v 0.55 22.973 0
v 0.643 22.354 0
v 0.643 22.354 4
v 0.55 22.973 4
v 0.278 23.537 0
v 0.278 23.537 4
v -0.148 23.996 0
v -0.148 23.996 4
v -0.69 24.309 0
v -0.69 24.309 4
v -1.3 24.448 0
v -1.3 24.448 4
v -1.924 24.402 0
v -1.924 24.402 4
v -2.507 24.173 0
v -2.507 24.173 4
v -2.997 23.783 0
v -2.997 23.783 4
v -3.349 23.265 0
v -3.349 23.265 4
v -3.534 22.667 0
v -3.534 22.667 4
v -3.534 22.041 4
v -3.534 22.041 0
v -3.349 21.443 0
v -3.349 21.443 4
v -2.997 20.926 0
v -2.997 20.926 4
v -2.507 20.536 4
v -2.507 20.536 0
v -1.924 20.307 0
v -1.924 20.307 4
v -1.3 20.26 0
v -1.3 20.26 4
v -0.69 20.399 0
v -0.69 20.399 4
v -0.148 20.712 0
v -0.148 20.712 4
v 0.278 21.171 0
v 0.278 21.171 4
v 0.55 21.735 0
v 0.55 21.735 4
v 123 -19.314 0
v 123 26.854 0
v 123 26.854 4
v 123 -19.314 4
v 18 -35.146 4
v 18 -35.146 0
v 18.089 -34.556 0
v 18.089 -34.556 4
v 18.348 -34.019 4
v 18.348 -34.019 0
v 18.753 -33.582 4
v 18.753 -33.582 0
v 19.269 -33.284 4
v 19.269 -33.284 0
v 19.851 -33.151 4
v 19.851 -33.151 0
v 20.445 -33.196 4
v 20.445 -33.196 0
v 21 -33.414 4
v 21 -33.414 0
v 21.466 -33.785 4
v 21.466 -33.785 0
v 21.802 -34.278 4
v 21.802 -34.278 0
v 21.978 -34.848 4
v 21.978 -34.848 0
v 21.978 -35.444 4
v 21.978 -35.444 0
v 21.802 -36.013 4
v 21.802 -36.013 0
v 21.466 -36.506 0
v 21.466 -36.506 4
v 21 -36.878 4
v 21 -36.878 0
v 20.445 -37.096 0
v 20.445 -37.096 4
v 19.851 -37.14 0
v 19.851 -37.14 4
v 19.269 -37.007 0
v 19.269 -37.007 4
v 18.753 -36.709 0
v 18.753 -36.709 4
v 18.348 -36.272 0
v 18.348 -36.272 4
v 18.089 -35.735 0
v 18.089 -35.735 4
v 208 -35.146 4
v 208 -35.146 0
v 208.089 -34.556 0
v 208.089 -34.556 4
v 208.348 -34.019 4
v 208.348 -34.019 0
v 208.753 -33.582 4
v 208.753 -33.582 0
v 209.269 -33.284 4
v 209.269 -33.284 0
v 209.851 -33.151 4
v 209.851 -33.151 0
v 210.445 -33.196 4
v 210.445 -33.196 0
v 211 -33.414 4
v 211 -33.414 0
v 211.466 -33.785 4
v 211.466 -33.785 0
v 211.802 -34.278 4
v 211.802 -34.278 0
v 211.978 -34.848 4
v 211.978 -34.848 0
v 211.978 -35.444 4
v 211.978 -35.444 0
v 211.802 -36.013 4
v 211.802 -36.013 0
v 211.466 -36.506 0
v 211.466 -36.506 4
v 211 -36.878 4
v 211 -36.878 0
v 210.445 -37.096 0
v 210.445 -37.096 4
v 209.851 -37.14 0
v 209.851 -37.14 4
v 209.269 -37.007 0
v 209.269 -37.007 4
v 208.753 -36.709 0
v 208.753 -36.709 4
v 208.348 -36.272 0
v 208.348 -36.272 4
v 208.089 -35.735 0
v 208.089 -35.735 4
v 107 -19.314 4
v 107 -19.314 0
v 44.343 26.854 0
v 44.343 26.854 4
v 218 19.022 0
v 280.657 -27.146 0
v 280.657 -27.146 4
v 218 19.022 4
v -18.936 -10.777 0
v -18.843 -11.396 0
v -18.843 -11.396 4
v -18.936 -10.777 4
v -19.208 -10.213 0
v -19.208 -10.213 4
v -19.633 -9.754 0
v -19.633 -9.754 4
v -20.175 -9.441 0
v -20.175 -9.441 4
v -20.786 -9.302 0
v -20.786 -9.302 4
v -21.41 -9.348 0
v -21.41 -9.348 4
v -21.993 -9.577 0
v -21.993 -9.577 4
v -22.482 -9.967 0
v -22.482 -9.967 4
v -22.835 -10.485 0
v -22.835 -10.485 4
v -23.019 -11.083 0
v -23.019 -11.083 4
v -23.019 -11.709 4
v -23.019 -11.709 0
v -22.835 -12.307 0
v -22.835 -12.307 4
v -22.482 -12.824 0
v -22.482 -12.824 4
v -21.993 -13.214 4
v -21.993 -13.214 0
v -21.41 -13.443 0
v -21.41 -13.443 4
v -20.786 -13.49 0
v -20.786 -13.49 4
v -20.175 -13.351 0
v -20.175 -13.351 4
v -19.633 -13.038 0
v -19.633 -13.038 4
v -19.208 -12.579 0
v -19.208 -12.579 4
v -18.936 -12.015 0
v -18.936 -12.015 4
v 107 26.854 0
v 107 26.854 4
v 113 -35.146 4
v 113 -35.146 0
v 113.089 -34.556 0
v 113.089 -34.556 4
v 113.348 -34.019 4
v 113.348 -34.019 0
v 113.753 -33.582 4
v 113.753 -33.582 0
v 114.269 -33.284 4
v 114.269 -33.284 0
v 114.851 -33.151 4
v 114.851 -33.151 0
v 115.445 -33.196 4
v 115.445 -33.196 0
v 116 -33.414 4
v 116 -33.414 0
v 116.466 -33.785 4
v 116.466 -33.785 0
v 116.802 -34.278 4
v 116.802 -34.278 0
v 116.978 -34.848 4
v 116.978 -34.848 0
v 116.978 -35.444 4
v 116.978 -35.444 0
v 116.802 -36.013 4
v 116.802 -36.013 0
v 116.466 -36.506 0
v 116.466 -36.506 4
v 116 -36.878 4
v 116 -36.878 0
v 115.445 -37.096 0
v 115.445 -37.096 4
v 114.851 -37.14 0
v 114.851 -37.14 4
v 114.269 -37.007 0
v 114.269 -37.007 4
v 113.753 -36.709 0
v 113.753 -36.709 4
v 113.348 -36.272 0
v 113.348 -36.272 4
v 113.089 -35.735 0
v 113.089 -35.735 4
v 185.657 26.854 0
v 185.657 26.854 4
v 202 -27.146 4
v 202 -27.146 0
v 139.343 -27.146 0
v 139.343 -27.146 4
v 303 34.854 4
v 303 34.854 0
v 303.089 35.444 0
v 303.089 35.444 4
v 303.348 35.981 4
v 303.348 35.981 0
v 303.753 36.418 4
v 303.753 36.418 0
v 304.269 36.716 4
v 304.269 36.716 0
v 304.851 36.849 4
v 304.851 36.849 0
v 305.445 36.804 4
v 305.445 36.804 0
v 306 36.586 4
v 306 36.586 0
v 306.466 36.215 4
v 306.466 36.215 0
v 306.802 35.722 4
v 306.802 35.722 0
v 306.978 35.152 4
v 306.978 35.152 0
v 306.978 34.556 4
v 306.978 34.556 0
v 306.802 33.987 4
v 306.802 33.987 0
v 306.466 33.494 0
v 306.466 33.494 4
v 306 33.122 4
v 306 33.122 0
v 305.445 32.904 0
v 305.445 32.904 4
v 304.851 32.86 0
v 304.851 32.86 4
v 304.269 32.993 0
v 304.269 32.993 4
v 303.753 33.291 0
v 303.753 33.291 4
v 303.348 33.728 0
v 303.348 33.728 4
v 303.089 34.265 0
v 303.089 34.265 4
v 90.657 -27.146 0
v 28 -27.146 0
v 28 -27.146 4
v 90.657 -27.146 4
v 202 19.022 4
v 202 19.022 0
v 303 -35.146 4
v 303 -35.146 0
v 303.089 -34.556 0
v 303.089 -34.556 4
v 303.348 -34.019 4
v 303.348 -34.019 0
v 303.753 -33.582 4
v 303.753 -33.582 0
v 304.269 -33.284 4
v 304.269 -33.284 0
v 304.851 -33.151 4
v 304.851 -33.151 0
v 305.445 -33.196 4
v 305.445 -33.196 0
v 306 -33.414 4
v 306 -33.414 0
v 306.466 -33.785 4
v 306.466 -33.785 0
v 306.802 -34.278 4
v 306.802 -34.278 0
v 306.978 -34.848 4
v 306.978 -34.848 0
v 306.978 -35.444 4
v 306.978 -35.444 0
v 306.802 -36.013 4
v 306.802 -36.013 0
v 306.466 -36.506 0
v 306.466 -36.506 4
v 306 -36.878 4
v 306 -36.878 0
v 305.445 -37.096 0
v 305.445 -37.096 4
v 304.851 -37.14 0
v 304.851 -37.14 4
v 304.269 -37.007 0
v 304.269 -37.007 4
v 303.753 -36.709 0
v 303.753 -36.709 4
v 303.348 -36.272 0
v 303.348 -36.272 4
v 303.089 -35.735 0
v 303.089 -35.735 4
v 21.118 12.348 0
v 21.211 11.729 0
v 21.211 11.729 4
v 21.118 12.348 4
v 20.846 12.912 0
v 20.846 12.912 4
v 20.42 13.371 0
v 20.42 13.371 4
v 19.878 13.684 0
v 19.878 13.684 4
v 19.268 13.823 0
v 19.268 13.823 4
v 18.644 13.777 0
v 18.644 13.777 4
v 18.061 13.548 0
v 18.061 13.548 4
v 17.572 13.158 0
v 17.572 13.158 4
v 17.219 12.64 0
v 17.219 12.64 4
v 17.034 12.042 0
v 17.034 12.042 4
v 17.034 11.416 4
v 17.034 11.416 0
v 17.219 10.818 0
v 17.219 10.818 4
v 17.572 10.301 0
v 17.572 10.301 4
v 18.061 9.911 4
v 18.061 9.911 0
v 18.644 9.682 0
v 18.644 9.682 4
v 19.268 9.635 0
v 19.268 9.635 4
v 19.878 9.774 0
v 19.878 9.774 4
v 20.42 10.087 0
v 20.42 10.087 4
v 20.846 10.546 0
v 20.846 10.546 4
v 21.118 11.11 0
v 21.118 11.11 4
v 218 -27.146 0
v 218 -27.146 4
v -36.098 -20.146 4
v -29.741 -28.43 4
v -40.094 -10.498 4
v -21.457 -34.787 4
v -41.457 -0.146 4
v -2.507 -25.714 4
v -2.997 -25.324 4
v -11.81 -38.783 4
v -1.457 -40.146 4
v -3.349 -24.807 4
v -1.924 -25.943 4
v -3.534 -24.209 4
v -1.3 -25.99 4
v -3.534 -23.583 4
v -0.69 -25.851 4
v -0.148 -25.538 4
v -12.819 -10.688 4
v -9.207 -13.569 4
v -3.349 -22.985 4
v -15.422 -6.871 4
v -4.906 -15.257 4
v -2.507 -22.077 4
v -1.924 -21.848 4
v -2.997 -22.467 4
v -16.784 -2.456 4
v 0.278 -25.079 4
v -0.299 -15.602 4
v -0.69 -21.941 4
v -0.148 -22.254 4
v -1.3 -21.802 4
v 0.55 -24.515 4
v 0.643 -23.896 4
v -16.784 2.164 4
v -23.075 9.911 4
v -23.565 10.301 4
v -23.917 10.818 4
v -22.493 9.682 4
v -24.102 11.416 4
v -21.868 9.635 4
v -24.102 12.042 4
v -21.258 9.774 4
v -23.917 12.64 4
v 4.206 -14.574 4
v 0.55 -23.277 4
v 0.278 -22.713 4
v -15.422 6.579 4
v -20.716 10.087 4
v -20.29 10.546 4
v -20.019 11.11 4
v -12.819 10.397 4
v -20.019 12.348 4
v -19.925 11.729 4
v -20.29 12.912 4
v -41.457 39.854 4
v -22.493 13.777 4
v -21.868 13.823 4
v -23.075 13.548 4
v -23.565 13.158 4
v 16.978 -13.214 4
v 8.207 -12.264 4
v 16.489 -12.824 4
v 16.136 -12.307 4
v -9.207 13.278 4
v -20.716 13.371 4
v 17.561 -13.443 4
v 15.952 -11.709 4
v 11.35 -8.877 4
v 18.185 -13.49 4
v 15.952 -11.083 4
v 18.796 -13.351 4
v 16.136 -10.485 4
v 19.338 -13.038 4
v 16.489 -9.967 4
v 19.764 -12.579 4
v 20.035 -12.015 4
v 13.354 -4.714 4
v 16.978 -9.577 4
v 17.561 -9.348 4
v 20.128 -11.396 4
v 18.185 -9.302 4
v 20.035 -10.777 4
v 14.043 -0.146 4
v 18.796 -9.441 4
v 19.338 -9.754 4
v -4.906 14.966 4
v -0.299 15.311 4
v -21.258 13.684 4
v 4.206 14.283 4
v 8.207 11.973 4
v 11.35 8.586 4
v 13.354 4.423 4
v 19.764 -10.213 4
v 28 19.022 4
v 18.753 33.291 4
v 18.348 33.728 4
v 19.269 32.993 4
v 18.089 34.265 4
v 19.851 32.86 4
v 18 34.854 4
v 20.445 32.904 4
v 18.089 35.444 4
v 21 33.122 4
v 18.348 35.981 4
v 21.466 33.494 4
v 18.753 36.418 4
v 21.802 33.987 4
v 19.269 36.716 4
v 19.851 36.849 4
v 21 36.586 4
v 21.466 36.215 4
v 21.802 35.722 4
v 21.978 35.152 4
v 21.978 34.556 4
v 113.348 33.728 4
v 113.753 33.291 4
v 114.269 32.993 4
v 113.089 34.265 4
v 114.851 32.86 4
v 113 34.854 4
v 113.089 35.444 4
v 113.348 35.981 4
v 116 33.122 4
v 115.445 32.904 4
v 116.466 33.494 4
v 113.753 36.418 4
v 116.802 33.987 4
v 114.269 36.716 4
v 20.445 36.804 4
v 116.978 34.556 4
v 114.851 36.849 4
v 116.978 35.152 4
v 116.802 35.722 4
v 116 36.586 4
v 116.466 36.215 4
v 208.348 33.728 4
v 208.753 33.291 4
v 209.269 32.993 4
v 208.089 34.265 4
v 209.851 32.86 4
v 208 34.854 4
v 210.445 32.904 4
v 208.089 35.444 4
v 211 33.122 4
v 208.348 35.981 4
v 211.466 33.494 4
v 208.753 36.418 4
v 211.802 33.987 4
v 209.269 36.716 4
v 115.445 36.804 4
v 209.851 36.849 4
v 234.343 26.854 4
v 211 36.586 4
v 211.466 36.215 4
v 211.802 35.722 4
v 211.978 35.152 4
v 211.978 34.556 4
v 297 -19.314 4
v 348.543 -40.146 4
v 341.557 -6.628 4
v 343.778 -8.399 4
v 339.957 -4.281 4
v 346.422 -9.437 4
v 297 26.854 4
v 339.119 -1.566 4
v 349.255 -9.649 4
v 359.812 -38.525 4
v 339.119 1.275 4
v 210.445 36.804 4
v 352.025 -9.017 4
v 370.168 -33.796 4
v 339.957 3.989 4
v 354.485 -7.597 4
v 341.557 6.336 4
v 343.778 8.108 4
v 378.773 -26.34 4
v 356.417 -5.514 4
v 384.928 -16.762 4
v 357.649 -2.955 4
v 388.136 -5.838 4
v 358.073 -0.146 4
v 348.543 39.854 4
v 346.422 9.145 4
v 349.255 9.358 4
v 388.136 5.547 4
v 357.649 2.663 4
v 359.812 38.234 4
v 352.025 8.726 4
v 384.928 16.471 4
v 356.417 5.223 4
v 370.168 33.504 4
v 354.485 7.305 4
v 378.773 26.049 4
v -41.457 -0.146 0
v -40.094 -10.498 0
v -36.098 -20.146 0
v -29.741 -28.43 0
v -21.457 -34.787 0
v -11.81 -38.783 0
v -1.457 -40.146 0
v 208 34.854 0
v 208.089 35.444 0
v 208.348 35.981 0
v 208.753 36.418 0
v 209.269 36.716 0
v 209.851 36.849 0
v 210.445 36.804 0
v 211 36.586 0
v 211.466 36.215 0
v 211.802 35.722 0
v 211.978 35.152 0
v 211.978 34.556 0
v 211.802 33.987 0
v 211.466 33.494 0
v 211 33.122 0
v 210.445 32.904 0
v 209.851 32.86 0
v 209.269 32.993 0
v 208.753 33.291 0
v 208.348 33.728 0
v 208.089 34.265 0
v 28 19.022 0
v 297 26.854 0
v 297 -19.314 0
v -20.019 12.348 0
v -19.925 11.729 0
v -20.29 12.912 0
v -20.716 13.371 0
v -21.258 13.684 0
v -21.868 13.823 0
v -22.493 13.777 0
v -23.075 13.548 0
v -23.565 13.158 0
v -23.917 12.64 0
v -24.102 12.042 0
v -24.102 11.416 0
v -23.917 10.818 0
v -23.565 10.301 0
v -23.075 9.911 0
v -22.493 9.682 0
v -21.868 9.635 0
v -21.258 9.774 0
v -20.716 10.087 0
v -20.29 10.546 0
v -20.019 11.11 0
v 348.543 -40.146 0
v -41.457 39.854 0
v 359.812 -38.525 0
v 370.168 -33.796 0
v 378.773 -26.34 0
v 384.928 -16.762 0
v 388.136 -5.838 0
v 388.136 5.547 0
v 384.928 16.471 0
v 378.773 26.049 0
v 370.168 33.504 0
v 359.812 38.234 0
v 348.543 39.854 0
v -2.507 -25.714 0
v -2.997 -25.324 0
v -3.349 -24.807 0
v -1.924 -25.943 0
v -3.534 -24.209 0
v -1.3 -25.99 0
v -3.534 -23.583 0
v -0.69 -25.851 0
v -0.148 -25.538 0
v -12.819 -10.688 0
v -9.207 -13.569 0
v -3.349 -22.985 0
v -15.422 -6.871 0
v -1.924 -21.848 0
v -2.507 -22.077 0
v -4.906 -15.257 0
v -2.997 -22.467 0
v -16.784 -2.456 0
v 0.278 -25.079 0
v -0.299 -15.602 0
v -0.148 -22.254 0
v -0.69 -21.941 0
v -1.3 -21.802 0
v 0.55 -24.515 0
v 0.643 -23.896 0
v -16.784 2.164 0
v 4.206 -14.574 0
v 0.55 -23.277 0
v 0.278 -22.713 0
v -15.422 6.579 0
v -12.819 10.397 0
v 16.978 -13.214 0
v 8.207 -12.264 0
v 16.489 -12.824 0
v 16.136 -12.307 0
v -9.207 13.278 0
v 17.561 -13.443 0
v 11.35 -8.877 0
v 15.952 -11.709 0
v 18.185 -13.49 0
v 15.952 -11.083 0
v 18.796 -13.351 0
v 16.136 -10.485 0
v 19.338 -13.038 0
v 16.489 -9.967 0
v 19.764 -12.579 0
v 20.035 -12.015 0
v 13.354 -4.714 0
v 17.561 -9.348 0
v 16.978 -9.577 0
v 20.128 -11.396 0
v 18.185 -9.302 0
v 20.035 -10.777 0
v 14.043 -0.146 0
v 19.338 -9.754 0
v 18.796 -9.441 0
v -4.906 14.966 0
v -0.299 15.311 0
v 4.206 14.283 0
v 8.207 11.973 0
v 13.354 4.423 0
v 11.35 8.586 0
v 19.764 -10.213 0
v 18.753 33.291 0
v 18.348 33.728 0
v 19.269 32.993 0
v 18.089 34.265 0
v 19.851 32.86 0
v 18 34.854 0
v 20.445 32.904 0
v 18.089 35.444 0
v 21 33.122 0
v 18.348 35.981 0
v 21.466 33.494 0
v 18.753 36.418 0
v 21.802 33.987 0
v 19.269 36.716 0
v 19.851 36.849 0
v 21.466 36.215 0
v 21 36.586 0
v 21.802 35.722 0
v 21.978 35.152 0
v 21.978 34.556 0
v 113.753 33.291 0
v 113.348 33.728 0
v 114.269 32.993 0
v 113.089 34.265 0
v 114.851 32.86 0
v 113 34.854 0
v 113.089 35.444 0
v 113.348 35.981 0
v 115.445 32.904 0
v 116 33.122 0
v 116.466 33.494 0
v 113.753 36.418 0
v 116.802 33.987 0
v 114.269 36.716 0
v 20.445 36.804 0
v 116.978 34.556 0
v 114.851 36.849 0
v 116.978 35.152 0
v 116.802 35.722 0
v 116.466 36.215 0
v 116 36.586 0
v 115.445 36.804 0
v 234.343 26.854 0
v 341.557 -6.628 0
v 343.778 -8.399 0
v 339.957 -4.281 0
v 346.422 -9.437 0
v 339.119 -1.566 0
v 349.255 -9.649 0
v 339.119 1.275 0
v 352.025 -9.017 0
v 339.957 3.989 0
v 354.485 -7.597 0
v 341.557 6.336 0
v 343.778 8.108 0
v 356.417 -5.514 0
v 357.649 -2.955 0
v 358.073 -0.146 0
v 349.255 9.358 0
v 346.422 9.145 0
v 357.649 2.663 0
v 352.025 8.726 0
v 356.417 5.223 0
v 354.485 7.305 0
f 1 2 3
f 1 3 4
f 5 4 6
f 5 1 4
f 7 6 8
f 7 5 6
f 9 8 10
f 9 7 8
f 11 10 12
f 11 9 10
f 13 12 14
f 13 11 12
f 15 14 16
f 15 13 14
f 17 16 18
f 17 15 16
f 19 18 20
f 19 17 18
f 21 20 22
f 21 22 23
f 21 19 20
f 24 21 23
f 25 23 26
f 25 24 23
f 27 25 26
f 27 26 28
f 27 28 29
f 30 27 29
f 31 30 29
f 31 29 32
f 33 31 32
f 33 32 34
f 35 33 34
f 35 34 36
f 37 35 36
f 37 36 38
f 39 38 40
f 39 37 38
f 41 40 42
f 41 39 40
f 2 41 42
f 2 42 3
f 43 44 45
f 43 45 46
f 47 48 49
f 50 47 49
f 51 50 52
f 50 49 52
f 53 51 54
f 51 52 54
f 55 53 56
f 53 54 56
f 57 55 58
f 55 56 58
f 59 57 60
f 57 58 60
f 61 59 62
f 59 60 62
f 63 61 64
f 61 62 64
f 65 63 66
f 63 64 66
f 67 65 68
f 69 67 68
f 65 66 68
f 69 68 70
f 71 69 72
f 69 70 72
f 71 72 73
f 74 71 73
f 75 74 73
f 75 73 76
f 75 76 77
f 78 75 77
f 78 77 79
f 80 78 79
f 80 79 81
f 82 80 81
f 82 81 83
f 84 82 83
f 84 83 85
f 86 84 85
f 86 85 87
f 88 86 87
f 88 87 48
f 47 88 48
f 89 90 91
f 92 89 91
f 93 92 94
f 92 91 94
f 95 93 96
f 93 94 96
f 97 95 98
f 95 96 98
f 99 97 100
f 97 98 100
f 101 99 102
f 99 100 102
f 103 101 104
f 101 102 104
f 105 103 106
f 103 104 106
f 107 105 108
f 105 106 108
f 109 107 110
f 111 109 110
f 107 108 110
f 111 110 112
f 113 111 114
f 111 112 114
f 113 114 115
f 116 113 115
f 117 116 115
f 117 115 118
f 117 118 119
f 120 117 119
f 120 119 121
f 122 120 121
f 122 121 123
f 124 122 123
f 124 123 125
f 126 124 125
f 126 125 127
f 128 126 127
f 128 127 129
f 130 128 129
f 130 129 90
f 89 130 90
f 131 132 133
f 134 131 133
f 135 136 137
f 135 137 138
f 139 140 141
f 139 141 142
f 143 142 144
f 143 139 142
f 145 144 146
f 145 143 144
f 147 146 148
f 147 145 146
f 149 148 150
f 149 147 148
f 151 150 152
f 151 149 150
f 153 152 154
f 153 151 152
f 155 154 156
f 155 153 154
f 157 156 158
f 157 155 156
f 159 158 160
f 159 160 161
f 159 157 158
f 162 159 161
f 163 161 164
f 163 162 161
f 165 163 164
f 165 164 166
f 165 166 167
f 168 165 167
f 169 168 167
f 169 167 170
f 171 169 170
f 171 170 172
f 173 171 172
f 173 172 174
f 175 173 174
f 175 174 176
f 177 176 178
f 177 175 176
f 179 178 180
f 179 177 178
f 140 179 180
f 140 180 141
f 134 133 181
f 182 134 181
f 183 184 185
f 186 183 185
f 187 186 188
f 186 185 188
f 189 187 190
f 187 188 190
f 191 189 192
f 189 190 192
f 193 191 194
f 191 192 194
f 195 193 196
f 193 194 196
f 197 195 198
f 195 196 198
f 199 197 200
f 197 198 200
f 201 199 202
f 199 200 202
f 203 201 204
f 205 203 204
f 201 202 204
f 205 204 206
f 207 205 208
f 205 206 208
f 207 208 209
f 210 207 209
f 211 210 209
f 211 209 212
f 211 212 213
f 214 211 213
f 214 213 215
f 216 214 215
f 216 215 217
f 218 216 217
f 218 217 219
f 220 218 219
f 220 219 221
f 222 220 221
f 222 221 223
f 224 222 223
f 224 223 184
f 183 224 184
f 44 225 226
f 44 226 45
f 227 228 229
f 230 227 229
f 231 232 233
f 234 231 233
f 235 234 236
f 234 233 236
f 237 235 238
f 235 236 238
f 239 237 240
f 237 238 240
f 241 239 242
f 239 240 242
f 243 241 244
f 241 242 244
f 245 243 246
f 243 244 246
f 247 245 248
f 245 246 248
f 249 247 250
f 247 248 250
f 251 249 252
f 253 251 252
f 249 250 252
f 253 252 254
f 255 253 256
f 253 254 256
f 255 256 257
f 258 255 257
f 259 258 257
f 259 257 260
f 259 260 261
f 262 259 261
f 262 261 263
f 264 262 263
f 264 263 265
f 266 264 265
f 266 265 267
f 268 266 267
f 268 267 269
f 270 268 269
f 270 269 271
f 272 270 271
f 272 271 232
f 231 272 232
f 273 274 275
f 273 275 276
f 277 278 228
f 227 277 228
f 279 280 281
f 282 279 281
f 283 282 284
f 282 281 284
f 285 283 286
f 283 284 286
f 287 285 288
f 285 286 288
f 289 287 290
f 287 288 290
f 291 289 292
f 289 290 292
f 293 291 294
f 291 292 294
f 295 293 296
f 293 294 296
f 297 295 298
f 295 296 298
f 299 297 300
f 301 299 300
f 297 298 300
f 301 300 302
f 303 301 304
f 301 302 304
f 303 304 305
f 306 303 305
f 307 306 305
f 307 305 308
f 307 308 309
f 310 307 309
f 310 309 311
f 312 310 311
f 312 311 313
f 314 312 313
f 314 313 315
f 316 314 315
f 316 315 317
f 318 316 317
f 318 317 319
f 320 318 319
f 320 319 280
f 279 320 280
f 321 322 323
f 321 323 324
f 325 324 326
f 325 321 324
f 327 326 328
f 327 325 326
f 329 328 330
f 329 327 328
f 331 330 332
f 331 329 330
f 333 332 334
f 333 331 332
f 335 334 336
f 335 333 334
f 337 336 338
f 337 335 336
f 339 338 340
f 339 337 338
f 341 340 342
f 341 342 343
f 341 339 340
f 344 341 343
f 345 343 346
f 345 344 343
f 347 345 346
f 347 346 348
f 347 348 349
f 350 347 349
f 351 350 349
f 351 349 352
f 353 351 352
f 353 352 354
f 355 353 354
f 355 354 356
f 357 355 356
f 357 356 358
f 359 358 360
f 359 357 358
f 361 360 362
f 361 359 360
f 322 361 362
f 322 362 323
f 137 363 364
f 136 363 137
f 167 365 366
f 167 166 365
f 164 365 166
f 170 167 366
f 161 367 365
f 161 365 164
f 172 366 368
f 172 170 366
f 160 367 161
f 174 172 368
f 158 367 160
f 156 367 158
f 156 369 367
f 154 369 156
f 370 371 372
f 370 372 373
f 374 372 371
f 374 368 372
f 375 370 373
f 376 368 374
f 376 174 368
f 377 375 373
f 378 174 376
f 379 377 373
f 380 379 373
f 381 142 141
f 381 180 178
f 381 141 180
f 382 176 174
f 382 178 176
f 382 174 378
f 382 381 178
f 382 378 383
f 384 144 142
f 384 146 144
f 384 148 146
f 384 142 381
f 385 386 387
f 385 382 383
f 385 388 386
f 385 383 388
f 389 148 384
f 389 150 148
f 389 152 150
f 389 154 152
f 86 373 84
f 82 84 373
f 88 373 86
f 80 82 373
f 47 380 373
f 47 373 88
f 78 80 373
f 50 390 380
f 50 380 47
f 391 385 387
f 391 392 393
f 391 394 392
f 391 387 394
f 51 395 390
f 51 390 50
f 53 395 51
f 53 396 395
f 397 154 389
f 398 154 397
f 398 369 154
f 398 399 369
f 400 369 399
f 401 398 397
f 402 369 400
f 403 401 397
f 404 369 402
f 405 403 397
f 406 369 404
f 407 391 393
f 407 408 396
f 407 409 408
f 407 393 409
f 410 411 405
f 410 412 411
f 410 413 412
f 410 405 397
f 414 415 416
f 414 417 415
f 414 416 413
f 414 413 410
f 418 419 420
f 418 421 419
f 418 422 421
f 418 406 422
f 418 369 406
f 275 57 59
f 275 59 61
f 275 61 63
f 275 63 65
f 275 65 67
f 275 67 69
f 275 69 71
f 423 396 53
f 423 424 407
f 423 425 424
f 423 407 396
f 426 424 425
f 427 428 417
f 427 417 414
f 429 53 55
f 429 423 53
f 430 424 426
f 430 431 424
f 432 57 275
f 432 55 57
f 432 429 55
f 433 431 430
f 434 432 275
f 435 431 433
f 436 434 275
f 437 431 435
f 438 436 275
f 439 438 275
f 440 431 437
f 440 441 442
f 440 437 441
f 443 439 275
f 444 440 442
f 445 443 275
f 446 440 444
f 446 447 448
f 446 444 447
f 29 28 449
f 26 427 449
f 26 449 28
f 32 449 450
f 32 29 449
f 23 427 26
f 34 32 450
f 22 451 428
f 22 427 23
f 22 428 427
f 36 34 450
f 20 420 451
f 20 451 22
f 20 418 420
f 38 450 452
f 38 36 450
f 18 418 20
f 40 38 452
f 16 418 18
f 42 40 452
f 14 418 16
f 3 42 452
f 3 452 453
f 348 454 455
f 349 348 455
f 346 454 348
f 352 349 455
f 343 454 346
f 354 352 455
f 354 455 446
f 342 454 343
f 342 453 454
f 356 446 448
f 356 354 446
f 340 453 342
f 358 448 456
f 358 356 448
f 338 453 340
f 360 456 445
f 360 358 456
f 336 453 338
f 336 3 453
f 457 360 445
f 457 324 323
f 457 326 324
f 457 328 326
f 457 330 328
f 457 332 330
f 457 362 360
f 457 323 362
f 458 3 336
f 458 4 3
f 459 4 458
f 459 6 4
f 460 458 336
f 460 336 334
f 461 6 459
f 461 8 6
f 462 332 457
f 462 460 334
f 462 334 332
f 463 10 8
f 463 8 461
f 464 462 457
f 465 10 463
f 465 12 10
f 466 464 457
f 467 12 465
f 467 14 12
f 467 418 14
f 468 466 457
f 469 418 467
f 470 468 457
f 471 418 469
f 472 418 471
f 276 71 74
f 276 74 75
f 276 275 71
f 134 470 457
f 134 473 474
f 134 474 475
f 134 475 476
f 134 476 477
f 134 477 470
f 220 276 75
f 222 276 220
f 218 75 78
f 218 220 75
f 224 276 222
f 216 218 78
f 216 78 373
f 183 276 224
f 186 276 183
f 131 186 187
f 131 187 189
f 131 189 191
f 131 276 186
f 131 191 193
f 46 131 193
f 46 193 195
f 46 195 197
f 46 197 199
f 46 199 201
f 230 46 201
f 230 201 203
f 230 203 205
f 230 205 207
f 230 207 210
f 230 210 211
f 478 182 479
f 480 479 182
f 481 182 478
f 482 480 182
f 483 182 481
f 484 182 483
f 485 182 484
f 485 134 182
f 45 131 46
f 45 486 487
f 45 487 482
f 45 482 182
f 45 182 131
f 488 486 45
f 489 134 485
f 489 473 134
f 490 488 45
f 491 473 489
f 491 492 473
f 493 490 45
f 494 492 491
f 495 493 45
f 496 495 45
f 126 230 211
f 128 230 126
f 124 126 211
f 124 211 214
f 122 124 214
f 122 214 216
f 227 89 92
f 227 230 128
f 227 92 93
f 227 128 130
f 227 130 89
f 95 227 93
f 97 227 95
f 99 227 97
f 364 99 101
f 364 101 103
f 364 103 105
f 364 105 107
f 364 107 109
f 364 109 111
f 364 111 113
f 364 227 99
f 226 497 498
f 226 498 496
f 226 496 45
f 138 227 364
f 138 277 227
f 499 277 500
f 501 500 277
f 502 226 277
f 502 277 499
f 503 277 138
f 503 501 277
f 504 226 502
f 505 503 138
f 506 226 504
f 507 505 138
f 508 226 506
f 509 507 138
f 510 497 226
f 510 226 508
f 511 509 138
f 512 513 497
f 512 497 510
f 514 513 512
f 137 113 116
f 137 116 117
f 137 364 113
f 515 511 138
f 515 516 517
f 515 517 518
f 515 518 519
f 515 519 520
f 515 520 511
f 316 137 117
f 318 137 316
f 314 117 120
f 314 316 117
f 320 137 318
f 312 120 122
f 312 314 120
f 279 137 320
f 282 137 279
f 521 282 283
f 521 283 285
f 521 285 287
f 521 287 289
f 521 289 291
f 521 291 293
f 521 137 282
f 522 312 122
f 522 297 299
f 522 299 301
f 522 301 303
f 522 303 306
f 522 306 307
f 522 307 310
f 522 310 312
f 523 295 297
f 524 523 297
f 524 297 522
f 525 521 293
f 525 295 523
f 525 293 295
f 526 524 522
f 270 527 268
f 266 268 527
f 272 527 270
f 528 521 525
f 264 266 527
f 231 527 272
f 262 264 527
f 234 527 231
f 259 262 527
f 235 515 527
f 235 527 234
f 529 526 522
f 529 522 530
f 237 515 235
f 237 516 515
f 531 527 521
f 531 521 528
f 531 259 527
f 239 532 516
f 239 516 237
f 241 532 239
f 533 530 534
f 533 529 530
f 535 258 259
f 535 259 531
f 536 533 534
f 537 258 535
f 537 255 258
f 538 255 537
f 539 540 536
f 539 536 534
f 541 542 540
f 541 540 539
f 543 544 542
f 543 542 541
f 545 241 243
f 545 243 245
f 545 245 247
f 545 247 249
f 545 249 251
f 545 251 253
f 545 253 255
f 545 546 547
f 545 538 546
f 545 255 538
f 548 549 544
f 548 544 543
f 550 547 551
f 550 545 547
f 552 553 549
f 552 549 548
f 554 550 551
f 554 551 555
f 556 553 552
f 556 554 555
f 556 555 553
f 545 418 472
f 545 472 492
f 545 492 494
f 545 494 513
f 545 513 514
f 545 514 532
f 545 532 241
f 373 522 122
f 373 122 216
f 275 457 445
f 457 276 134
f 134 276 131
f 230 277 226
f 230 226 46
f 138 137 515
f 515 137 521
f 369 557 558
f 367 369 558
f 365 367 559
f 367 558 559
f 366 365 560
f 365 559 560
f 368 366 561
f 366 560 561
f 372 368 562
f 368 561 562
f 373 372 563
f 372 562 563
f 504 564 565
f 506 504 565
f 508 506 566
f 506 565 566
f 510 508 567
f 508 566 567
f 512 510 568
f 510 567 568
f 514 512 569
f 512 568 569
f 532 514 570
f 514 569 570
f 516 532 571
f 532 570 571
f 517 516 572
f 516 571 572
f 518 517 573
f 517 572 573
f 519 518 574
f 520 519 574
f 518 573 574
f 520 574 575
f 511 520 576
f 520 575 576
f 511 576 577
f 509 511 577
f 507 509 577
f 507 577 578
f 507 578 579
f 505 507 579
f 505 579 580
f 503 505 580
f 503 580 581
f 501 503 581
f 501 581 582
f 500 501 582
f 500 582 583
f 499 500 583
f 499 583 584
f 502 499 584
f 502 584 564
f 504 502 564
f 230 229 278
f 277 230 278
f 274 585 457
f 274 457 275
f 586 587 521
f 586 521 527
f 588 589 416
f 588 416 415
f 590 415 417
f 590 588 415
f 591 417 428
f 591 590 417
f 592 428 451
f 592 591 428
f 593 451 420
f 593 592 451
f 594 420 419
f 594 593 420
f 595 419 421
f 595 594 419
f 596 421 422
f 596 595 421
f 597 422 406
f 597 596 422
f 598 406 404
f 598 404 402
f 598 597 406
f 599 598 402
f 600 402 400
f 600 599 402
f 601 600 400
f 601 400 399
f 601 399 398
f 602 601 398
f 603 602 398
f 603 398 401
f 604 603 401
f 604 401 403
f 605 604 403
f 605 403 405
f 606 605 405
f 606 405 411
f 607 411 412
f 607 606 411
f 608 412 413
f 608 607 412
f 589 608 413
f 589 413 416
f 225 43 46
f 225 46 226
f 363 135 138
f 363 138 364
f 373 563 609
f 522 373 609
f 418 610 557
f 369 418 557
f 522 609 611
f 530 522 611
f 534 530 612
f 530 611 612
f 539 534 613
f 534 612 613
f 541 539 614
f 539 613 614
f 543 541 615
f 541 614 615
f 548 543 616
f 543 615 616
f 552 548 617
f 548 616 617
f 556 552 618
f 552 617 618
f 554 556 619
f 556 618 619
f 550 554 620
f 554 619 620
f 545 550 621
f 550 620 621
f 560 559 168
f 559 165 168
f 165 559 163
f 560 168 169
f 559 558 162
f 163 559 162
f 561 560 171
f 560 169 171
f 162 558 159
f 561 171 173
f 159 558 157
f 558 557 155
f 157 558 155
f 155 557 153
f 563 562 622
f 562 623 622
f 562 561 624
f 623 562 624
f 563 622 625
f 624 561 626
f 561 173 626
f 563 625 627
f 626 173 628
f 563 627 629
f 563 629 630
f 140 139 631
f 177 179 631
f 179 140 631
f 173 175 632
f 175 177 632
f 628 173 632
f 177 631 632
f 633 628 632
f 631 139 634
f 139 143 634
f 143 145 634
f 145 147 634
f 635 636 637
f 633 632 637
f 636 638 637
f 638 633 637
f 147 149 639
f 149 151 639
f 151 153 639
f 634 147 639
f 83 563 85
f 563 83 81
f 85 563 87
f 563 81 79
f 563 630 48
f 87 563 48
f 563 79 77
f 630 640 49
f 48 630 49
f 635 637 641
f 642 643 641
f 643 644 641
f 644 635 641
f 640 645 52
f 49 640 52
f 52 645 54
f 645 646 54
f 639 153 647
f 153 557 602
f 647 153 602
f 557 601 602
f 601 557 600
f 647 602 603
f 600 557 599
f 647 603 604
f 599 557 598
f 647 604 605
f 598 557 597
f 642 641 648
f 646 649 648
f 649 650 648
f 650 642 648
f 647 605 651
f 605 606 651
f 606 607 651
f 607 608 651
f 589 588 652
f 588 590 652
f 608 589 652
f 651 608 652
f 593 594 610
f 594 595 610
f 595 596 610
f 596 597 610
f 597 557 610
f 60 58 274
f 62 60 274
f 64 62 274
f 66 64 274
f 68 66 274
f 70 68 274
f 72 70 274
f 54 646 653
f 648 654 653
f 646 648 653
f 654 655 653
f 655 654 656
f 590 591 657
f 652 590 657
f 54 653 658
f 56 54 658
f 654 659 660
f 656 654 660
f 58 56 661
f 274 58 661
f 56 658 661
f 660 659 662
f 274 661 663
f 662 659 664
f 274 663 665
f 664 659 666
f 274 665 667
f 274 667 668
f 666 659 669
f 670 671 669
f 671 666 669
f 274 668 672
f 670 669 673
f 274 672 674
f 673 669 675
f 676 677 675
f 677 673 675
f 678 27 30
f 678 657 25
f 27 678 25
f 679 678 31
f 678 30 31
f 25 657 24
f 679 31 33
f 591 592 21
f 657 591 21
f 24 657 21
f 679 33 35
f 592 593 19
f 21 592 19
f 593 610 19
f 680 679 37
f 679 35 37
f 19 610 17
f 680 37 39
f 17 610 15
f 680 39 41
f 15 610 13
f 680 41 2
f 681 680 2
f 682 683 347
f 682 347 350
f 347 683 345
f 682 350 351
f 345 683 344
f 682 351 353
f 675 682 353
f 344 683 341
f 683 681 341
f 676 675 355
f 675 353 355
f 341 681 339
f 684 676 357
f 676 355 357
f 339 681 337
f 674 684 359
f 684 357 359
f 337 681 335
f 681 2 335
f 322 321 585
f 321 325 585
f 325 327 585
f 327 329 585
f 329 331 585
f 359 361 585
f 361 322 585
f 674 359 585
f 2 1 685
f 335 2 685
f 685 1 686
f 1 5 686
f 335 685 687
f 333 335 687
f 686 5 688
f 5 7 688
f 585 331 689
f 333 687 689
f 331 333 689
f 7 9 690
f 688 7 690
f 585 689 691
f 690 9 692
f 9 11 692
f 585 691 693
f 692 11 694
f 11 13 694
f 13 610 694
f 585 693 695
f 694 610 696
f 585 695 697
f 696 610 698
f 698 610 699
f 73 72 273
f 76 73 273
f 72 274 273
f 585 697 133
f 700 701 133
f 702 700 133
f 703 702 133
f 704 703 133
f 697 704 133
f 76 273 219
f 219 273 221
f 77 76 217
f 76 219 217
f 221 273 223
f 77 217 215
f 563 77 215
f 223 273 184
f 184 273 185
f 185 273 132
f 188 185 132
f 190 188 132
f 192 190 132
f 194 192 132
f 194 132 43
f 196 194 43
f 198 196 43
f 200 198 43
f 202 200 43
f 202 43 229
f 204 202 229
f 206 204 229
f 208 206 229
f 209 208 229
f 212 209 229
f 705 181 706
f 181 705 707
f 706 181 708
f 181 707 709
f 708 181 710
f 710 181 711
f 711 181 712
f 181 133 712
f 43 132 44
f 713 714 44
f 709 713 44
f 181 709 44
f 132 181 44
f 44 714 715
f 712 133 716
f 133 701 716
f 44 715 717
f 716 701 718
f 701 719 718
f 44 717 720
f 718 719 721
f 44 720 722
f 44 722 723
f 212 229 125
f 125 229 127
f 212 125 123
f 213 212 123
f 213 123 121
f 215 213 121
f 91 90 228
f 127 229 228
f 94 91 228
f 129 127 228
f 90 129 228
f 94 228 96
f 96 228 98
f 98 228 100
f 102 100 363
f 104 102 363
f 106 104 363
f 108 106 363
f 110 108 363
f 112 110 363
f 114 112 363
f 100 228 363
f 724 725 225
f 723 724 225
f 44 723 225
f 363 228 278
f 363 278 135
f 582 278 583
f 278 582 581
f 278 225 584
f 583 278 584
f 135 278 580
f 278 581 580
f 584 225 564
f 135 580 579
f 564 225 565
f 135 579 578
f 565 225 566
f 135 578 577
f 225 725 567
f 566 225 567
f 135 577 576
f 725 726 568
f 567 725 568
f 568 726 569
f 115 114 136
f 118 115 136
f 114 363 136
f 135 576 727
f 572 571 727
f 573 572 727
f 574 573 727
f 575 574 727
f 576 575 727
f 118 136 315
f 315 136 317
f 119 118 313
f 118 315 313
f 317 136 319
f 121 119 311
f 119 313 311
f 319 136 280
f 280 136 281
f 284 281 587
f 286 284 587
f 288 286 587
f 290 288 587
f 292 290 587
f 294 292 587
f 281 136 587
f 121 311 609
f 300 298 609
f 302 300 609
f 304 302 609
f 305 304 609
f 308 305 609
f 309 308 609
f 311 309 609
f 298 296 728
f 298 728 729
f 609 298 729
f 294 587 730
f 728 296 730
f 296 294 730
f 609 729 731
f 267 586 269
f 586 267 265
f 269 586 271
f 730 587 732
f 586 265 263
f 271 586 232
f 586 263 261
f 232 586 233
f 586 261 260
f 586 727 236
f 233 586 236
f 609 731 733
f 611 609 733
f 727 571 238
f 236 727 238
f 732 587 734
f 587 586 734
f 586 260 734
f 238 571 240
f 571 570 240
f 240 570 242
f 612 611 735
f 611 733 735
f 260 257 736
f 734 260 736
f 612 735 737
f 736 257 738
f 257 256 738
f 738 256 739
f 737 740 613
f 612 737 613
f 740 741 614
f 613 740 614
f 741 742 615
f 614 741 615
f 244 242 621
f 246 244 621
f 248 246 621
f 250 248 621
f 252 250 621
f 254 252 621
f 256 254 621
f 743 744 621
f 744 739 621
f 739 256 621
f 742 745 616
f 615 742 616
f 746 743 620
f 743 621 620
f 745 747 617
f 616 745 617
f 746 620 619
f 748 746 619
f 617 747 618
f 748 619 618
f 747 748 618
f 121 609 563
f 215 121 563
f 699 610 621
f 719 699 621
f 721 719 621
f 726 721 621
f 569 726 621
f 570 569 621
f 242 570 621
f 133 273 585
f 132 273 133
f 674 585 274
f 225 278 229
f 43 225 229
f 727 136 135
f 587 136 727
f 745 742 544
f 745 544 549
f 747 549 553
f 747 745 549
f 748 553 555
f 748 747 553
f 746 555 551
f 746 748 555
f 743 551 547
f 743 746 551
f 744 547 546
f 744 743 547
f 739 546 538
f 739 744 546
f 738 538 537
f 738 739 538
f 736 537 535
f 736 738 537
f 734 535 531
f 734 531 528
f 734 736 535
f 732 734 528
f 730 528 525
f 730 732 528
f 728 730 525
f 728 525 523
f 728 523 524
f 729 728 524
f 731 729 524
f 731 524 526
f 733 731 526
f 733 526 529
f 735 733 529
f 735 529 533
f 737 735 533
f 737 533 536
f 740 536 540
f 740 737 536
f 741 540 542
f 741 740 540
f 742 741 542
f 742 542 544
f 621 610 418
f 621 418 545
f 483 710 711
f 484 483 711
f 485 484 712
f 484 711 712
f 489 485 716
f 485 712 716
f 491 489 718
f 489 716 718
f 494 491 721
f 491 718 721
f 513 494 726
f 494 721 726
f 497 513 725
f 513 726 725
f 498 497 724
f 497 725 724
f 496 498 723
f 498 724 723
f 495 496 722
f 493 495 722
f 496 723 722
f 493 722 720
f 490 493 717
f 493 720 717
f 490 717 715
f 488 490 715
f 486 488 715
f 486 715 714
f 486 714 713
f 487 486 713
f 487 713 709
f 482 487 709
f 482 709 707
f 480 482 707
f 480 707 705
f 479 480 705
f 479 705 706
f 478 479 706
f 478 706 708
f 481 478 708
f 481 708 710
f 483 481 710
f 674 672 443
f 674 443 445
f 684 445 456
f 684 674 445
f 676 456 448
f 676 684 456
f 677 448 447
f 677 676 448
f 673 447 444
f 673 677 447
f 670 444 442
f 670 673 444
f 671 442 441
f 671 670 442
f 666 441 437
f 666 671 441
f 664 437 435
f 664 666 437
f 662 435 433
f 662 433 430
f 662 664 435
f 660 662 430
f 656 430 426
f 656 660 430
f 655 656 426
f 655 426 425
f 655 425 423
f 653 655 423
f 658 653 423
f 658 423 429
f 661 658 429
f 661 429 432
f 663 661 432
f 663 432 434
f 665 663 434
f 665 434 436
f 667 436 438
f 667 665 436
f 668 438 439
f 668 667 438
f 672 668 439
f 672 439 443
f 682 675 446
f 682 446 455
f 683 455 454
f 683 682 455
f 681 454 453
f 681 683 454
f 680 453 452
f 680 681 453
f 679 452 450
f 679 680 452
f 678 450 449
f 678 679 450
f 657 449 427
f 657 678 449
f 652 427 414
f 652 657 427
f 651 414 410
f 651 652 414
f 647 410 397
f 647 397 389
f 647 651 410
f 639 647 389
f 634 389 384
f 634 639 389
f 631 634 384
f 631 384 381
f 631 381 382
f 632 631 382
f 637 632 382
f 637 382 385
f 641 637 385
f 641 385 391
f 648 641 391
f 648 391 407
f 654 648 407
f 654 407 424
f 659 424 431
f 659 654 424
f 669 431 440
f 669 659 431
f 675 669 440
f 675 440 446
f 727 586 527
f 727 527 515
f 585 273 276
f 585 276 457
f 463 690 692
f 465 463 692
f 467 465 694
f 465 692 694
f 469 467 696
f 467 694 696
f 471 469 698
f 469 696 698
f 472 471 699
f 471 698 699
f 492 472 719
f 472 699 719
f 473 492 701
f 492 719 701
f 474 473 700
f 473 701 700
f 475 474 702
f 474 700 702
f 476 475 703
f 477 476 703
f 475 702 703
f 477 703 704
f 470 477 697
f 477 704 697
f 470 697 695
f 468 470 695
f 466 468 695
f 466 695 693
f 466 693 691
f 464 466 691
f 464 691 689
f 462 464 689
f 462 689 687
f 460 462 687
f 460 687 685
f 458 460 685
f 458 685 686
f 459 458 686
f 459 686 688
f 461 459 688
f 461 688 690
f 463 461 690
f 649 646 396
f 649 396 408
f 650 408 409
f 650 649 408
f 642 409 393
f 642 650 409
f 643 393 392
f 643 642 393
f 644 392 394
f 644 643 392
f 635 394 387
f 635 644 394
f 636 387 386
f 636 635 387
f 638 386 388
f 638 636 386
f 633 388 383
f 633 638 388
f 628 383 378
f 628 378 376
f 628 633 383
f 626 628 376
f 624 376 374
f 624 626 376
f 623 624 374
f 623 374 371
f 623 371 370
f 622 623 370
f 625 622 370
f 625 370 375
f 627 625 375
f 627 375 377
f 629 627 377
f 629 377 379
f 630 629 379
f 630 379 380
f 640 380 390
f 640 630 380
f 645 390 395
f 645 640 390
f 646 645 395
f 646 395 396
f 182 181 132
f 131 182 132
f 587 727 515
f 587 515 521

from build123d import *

# Parameters (mm, degrees)
SKETCH_1_R          = 2.1
SKETCH_1_R_2        = 15.5
SKETCH_1_R_3        = 9.53
EXTRUDE_1_DEPTH     = 4
SKETCH_2_R          = 2
CUT_EXTRUDE_1_DEPTH = 10
EXTRUDE_2_DEPTH     = 4


with BuildPart() as part:
    # 草图1 → 凸台-拉伸1 (new body)
    with BuildSketch(Plane.XY):
        with BuildLine():
            ThreePointArc((-1.457142857, 39.854285714), (-41.457142857, -0.145714286), (-1.457142857, -40.145714286))
            Line((-1.457142857, -40.145714286), (348.542857143, -40.145714286))
            ThreePointArc((348.542857143, -40.145714286), (388.542857143, -0.145714286), (348.542857143, 39.854285714))
            Line((348.542857143, 39.854285714), (14.042857143, 39.854285714))
            Line((14.042857143, 39.854285714), (-1.457142857, 39.854285714))
        make_face()
        with Locations((-1.457142857, -23.895714286)):
            Circle(SKETCH_1_R, mode=Mode.SUBTRACT)
        with Locations((-20.942714442, -11.395714286)):
            Circle(SKETCH_1_R, mode=Mode.SUBTRACT)
        with Locations((18.028428728, -11.395714286)):
            Circle(SKETCH_1_R, mode=Mode.SUBTRACT)
        with Locations((-1.457142857, -0.145714286)):
            Circle(SKETCH_1_R_2, mode=Mode.SUBTRACT)
        with Locations((348.542857143, -0.145714286)):
            Circle(SKETCH_1_R_3, mode=Mode.SUBTRACT)
        with Locations((-22.025246197, 11.729285714)):
            Circle(SKETCH_1_R, mode=Mode.SUBTRACT)
        with Locations((19.110960483, 11.729285714)):
            Circle(SKETCH_1_R, mode=Mode.SUBTRACT)
        with Locations((-1.457142857, 22.354285714)):
            Circle(SKETCH_1_R, mode=Mode.SUBTRACT)
    extrude(amount=EXTRUDE_1_DEPTH)

    # 草图2 → 切除-拉伸1 (cut)
    with BuildSketch(Plane(origin=(0, 0, 0), x_dir=(-1, 0, 0), z_dir=(0, 0, -1))):
        with Locations((-20, -35.145714286)):
            Circle(SKETCH_2_R)
        with Locations((-115, -35.145714286)):
            Circle(SKETCH_2_R)
        with Locations((-210, -35.145714286)):
            Circle(SKETCH_2_R)
        with Locations((-305, -35.145714286)):
            Circle(SKETCH_2_R)
        with Locations((-305, 34.854285714)):
            Circle(SKETCH_2_R)
        with Locations((-210, 34.854285714)):
            Circle(SKETCH_2_R)
        with Locations((-115, 34.854285714)):
            Circle(SKETCH_2_R)
        with Locations((-20, 34.854285714)):
            Circle(SKETCH_2_R)
        Polygon((-218, -27.145714286), (-280.656658604, -27.145714286), (-218, 19.022349949), align=None)
        Polygon((-234.343341396, 26.854285714), (-297, -19.31377852), (-297, 26.854285714), align=None)
        Polygon((-123, 26.854285714), (-123, -19.31377852), (-185.656658604, 26.854285714), align=None)
        Polygon((-202, -27.145714286), (-139.343341396, -27.145714286), (-202, 19.022349949), align=None)
        Polygon((-90.656658604, -27.145714286), (-28, 19.022349949), (-28, -27.145714286), align=None)
        Polygon((-107, -19.31377852), (-44.343341396, 26.854285714), (-107, 26.854285714), align=None)
    extrude(amount=-CUT_EXTRUDE_1_DEPTH, mode=Mode.SUBTRACT)

    # 草图3 → 凸台-拉伸2 (add)
    with BuildSketch(Plane(origin=(0, 0, 0), x_dir=(-1, 0, 0), z_dir=(0, 0, -1))):
        Polygon((1.457142857, 39.854285714), (35.608920787, 39.854285714), (41.457142857, 39.854285714), (41.457142857, -0.145714286), align=None)
    extrude(amount=-EXTRUDE_2_DEPTH)


solid = part.part
